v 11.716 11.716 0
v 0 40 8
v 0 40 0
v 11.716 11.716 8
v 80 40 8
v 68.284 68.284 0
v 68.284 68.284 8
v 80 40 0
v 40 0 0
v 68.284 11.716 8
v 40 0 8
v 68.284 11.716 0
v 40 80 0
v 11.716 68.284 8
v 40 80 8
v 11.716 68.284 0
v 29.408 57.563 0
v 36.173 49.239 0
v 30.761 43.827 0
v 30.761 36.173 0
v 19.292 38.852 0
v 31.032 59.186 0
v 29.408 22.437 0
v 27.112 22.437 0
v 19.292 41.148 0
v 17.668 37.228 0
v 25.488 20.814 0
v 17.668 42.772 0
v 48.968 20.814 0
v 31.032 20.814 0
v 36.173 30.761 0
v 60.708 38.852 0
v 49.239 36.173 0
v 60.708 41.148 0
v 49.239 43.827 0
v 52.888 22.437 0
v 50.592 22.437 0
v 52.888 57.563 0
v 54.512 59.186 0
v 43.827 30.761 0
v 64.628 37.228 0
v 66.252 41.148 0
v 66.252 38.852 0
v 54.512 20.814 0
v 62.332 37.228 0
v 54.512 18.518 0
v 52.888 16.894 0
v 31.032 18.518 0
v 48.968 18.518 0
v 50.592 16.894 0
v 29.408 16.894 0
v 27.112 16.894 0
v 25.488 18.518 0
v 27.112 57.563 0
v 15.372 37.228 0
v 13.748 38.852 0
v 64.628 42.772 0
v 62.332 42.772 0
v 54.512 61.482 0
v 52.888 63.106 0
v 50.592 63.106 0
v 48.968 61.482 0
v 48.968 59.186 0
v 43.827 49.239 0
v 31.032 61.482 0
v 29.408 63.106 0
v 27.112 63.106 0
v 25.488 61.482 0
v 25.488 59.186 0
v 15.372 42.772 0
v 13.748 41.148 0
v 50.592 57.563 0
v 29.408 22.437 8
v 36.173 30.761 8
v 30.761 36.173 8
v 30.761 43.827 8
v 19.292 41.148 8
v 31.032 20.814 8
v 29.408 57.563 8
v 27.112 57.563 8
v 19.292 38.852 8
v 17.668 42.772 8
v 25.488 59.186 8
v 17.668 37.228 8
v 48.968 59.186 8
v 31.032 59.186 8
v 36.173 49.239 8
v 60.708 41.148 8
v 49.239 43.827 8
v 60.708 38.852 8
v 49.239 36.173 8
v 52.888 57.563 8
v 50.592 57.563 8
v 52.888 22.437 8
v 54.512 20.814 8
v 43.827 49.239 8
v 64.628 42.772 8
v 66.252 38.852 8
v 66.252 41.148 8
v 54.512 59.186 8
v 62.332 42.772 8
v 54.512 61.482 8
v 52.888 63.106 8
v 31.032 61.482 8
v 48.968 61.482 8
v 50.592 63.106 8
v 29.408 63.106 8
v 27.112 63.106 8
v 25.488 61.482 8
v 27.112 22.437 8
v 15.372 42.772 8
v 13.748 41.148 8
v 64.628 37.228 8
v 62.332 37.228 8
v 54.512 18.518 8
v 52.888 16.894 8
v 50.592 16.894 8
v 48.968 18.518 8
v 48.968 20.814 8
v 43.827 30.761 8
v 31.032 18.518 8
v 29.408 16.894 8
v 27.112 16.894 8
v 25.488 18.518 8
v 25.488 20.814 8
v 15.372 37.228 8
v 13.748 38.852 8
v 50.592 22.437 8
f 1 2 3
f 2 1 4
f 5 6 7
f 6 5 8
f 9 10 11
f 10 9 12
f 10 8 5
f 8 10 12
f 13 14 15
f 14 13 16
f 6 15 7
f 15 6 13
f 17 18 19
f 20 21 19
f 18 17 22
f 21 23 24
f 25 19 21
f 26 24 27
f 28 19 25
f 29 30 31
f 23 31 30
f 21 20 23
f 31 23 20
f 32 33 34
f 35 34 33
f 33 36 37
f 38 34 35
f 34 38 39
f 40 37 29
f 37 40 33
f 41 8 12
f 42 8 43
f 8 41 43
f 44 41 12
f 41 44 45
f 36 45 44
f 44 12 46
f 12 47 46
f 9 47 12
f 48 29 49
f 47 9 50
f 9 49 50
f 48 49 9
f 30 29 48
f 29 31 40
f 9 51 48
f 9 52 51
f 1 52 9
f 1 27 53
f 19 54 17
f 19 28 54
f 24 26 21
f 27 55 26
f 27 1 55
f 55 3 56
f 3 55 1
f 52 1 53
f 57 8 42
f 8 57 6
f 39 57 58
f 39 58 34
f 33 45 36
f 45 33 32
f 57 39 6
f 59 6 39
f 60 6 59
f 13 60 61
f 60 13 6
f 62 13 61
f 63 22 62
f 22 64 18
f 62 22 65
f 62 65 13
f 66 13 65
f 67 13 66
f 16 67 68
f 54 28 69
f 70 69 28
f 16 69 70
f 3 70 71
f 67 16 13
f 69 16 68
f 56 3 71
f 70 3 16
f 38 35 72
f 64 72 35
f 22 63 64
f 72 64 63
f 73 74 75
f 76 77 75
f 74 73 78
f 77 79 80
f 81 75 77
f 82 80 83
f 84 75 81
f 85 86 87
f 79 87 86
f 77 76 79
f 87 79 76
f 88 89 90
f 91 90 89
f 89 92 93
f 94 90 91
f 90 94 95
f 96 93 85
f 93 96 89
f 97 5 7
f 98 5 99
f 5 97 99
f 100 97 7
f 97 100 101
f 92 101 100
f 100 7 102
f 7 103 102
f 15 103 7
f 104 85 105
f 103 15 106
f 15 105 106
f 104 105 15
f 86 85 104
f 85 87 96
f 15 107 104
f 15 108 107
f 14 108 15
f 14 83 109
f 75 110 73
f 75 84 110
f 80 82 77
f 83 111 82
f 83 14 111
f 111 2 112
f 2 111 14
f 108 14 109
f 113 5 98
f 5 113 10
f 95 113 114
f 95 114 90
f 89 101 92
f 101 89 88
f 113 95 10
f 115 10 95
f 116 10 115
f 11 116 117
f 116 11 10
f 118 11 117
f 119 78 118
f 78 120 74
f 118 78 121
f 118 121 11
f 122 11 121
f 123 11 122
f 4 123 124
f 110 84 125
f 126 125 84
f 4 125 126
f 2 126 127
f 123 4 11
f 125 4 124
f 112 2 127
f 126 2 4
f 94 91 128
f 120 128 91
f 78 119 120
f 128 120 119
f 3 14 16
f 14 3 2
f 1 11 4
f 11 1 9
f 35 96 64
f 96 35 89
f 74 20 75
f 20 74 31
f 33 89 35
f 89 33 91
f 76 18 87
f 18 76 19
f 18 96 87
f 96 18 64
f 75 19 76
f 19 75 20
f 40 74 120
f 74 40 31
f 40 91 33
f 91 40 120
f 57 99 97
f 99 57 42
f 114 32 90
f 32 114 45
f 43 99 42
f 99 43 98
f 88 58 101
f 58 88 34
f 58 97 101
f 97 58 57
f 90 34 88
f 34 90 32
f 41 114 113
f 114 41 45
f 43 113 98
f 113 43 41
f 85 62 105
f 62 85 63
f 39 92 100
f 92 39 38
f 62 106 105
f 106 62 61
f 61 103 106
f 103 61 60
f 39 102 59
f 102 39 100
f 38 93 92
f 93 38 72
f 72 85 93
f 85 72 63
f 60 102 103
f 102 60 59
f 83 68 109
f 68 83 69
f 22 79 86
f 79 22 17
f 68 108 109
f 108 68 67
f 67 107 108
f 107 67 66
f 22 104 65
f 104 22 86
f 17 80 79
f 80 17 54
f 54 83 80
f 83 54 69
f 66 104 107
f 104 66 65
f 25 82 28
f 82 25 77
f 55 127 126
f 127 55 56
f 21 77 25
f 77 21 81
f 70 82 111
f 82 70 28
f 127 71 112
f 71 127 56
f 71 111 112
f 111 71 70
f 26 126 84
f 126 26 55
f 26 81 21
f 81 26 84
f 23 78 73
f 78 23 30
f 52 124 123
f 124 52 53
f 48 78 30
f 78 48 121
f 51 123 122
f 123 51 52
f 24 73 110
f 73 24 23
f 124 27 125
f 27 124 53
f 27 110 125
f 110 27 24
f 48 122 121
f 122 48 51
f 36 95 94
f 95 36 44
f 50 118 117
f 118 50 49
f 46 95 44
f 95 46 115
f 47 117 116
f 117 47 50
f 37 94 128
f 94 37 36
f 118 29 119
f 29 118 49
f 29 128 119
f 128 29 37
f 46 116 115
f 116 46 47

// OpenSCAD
$fn = 32;

// ----------------------------------------------------------------------
// Polygon plate: 8-gon R40, 6 bolt windows
// ----------------------------------------------------------------------

// --- parameters (mm) ---
sides = 8;                // number of polygon sides
plate_r = 40;             // circumscribed radius of the polygon
bore_r = 10;              // centre bore radius
bolts = 6;                // number of bolt windows
ring_r = 23.48;           // bolt-circle radius
bolt_r = 3;               // bolt window radius
plate_t = 8;              // plate thickness, Z (extrusion height)

plate_d = 2 * plate_r;  // circumscribed diameter
bore_d = 2 * bore_r;  // centre bore diameter
bolt_d = 2 * bolt_r;  // bolt window diameter
ring_d = 2 * ring_r;  // bolt-circle diameter

profile = [[80, 40], [68.284, 68.284], [40, 80], [11.716, 68.284], [0, 40], [11.716, 11.716], [40, 0], [68.284, 11.716]];  // primary outline, 8 points, counter clockwise
void_1 = [[49.239, 43.827], [43.827, 49.239], [36.173, 49.239], [30.761, 43.827], [30.761, 36.173], [36.173, 30.761], [43.827, 30.761], [49.239, 36.173]];  // centre bore, 8 points
void_2 = [[66.252, 41.148], [64.628, 42.772], [62.332, 42.772], [60.708, 41.148], [60.708, 38.852], [62.332, 37.228], [64.628, 37.228], [66.252, 38.852]];  // bolt window 1, 8 points
void_3 = [[54.512, 61.482], [52.888, 63.106], [50.592, 63.106], [48.968, 61.482], [48.968, 59.186], [50.592, 57.563], [52.888, 57.563], [54.512, 59.186]];  // bolt window 2, 8 points
void_4 = [[31.032, 61.482], [29.408, 63.106], [27.112, 63.106], [25.488, 61.482], [25.488, 59.186], [27.112, 57.563], [29.408, 57.563], [31.032, 59.186]];  // bolt window 3, 8 points
void_5 = [[19.292, 41.148], [17.668, 42.772], [15.372, 42.772], [13.748, 41.148], [13.748, 38.852], [15.372, 37.228], [17.668, 37.228], [19.292, 38.852]];  // bolt window 4, 8 points
void_6 = [[31.032, 20.814], [29.408, 22.437], [27.112, 22.437], [25.488, 20.814], [25.488, 18.518], [27.112, 16.894], [29.408, 16.894], [31.032, 18.518]];  // bolt window 5, 8 points
void_7 = [[54.512, 20.814], [52.888, 22.437], [50.592, 22.437], [48.968, 20.814], [48.968, 18.518], [50.592, 16.894], [52.888, 16.894], [54.512, 18.518]];  // bolt window 6, 8 points

// --- the one profile operation ---
difference() {
  linear_extrude(height = plate_t) polygon(points = profile);
  translate([0, 0, -1])
    linear_extrude(height = plate_t + 2) polygon(points = void_1);
  translate([0, 0, -1])
    linear_extrude(height = plate_t + 2) polygon(points = void_2);
  translate([0, 0, -1])
    linear_extrude(height = plate_t + 2) polygon(points = void_3);
  translate([0, 0, -1])
    linear_extrude(height = plate_t + 2) polygon(points = void_4);
  translate([0, 0, -1])
    linear_extrude(height = plate_t + 2) polygon(points = void_5);
  translate([0, 0, -1])
    linear_extrude(height = plate_t + 2) polygon(points = void_6);
  translate([0, 0, -1])
    linear_extrude(height = plate_t + 2) polygon(points = void_7);
}
